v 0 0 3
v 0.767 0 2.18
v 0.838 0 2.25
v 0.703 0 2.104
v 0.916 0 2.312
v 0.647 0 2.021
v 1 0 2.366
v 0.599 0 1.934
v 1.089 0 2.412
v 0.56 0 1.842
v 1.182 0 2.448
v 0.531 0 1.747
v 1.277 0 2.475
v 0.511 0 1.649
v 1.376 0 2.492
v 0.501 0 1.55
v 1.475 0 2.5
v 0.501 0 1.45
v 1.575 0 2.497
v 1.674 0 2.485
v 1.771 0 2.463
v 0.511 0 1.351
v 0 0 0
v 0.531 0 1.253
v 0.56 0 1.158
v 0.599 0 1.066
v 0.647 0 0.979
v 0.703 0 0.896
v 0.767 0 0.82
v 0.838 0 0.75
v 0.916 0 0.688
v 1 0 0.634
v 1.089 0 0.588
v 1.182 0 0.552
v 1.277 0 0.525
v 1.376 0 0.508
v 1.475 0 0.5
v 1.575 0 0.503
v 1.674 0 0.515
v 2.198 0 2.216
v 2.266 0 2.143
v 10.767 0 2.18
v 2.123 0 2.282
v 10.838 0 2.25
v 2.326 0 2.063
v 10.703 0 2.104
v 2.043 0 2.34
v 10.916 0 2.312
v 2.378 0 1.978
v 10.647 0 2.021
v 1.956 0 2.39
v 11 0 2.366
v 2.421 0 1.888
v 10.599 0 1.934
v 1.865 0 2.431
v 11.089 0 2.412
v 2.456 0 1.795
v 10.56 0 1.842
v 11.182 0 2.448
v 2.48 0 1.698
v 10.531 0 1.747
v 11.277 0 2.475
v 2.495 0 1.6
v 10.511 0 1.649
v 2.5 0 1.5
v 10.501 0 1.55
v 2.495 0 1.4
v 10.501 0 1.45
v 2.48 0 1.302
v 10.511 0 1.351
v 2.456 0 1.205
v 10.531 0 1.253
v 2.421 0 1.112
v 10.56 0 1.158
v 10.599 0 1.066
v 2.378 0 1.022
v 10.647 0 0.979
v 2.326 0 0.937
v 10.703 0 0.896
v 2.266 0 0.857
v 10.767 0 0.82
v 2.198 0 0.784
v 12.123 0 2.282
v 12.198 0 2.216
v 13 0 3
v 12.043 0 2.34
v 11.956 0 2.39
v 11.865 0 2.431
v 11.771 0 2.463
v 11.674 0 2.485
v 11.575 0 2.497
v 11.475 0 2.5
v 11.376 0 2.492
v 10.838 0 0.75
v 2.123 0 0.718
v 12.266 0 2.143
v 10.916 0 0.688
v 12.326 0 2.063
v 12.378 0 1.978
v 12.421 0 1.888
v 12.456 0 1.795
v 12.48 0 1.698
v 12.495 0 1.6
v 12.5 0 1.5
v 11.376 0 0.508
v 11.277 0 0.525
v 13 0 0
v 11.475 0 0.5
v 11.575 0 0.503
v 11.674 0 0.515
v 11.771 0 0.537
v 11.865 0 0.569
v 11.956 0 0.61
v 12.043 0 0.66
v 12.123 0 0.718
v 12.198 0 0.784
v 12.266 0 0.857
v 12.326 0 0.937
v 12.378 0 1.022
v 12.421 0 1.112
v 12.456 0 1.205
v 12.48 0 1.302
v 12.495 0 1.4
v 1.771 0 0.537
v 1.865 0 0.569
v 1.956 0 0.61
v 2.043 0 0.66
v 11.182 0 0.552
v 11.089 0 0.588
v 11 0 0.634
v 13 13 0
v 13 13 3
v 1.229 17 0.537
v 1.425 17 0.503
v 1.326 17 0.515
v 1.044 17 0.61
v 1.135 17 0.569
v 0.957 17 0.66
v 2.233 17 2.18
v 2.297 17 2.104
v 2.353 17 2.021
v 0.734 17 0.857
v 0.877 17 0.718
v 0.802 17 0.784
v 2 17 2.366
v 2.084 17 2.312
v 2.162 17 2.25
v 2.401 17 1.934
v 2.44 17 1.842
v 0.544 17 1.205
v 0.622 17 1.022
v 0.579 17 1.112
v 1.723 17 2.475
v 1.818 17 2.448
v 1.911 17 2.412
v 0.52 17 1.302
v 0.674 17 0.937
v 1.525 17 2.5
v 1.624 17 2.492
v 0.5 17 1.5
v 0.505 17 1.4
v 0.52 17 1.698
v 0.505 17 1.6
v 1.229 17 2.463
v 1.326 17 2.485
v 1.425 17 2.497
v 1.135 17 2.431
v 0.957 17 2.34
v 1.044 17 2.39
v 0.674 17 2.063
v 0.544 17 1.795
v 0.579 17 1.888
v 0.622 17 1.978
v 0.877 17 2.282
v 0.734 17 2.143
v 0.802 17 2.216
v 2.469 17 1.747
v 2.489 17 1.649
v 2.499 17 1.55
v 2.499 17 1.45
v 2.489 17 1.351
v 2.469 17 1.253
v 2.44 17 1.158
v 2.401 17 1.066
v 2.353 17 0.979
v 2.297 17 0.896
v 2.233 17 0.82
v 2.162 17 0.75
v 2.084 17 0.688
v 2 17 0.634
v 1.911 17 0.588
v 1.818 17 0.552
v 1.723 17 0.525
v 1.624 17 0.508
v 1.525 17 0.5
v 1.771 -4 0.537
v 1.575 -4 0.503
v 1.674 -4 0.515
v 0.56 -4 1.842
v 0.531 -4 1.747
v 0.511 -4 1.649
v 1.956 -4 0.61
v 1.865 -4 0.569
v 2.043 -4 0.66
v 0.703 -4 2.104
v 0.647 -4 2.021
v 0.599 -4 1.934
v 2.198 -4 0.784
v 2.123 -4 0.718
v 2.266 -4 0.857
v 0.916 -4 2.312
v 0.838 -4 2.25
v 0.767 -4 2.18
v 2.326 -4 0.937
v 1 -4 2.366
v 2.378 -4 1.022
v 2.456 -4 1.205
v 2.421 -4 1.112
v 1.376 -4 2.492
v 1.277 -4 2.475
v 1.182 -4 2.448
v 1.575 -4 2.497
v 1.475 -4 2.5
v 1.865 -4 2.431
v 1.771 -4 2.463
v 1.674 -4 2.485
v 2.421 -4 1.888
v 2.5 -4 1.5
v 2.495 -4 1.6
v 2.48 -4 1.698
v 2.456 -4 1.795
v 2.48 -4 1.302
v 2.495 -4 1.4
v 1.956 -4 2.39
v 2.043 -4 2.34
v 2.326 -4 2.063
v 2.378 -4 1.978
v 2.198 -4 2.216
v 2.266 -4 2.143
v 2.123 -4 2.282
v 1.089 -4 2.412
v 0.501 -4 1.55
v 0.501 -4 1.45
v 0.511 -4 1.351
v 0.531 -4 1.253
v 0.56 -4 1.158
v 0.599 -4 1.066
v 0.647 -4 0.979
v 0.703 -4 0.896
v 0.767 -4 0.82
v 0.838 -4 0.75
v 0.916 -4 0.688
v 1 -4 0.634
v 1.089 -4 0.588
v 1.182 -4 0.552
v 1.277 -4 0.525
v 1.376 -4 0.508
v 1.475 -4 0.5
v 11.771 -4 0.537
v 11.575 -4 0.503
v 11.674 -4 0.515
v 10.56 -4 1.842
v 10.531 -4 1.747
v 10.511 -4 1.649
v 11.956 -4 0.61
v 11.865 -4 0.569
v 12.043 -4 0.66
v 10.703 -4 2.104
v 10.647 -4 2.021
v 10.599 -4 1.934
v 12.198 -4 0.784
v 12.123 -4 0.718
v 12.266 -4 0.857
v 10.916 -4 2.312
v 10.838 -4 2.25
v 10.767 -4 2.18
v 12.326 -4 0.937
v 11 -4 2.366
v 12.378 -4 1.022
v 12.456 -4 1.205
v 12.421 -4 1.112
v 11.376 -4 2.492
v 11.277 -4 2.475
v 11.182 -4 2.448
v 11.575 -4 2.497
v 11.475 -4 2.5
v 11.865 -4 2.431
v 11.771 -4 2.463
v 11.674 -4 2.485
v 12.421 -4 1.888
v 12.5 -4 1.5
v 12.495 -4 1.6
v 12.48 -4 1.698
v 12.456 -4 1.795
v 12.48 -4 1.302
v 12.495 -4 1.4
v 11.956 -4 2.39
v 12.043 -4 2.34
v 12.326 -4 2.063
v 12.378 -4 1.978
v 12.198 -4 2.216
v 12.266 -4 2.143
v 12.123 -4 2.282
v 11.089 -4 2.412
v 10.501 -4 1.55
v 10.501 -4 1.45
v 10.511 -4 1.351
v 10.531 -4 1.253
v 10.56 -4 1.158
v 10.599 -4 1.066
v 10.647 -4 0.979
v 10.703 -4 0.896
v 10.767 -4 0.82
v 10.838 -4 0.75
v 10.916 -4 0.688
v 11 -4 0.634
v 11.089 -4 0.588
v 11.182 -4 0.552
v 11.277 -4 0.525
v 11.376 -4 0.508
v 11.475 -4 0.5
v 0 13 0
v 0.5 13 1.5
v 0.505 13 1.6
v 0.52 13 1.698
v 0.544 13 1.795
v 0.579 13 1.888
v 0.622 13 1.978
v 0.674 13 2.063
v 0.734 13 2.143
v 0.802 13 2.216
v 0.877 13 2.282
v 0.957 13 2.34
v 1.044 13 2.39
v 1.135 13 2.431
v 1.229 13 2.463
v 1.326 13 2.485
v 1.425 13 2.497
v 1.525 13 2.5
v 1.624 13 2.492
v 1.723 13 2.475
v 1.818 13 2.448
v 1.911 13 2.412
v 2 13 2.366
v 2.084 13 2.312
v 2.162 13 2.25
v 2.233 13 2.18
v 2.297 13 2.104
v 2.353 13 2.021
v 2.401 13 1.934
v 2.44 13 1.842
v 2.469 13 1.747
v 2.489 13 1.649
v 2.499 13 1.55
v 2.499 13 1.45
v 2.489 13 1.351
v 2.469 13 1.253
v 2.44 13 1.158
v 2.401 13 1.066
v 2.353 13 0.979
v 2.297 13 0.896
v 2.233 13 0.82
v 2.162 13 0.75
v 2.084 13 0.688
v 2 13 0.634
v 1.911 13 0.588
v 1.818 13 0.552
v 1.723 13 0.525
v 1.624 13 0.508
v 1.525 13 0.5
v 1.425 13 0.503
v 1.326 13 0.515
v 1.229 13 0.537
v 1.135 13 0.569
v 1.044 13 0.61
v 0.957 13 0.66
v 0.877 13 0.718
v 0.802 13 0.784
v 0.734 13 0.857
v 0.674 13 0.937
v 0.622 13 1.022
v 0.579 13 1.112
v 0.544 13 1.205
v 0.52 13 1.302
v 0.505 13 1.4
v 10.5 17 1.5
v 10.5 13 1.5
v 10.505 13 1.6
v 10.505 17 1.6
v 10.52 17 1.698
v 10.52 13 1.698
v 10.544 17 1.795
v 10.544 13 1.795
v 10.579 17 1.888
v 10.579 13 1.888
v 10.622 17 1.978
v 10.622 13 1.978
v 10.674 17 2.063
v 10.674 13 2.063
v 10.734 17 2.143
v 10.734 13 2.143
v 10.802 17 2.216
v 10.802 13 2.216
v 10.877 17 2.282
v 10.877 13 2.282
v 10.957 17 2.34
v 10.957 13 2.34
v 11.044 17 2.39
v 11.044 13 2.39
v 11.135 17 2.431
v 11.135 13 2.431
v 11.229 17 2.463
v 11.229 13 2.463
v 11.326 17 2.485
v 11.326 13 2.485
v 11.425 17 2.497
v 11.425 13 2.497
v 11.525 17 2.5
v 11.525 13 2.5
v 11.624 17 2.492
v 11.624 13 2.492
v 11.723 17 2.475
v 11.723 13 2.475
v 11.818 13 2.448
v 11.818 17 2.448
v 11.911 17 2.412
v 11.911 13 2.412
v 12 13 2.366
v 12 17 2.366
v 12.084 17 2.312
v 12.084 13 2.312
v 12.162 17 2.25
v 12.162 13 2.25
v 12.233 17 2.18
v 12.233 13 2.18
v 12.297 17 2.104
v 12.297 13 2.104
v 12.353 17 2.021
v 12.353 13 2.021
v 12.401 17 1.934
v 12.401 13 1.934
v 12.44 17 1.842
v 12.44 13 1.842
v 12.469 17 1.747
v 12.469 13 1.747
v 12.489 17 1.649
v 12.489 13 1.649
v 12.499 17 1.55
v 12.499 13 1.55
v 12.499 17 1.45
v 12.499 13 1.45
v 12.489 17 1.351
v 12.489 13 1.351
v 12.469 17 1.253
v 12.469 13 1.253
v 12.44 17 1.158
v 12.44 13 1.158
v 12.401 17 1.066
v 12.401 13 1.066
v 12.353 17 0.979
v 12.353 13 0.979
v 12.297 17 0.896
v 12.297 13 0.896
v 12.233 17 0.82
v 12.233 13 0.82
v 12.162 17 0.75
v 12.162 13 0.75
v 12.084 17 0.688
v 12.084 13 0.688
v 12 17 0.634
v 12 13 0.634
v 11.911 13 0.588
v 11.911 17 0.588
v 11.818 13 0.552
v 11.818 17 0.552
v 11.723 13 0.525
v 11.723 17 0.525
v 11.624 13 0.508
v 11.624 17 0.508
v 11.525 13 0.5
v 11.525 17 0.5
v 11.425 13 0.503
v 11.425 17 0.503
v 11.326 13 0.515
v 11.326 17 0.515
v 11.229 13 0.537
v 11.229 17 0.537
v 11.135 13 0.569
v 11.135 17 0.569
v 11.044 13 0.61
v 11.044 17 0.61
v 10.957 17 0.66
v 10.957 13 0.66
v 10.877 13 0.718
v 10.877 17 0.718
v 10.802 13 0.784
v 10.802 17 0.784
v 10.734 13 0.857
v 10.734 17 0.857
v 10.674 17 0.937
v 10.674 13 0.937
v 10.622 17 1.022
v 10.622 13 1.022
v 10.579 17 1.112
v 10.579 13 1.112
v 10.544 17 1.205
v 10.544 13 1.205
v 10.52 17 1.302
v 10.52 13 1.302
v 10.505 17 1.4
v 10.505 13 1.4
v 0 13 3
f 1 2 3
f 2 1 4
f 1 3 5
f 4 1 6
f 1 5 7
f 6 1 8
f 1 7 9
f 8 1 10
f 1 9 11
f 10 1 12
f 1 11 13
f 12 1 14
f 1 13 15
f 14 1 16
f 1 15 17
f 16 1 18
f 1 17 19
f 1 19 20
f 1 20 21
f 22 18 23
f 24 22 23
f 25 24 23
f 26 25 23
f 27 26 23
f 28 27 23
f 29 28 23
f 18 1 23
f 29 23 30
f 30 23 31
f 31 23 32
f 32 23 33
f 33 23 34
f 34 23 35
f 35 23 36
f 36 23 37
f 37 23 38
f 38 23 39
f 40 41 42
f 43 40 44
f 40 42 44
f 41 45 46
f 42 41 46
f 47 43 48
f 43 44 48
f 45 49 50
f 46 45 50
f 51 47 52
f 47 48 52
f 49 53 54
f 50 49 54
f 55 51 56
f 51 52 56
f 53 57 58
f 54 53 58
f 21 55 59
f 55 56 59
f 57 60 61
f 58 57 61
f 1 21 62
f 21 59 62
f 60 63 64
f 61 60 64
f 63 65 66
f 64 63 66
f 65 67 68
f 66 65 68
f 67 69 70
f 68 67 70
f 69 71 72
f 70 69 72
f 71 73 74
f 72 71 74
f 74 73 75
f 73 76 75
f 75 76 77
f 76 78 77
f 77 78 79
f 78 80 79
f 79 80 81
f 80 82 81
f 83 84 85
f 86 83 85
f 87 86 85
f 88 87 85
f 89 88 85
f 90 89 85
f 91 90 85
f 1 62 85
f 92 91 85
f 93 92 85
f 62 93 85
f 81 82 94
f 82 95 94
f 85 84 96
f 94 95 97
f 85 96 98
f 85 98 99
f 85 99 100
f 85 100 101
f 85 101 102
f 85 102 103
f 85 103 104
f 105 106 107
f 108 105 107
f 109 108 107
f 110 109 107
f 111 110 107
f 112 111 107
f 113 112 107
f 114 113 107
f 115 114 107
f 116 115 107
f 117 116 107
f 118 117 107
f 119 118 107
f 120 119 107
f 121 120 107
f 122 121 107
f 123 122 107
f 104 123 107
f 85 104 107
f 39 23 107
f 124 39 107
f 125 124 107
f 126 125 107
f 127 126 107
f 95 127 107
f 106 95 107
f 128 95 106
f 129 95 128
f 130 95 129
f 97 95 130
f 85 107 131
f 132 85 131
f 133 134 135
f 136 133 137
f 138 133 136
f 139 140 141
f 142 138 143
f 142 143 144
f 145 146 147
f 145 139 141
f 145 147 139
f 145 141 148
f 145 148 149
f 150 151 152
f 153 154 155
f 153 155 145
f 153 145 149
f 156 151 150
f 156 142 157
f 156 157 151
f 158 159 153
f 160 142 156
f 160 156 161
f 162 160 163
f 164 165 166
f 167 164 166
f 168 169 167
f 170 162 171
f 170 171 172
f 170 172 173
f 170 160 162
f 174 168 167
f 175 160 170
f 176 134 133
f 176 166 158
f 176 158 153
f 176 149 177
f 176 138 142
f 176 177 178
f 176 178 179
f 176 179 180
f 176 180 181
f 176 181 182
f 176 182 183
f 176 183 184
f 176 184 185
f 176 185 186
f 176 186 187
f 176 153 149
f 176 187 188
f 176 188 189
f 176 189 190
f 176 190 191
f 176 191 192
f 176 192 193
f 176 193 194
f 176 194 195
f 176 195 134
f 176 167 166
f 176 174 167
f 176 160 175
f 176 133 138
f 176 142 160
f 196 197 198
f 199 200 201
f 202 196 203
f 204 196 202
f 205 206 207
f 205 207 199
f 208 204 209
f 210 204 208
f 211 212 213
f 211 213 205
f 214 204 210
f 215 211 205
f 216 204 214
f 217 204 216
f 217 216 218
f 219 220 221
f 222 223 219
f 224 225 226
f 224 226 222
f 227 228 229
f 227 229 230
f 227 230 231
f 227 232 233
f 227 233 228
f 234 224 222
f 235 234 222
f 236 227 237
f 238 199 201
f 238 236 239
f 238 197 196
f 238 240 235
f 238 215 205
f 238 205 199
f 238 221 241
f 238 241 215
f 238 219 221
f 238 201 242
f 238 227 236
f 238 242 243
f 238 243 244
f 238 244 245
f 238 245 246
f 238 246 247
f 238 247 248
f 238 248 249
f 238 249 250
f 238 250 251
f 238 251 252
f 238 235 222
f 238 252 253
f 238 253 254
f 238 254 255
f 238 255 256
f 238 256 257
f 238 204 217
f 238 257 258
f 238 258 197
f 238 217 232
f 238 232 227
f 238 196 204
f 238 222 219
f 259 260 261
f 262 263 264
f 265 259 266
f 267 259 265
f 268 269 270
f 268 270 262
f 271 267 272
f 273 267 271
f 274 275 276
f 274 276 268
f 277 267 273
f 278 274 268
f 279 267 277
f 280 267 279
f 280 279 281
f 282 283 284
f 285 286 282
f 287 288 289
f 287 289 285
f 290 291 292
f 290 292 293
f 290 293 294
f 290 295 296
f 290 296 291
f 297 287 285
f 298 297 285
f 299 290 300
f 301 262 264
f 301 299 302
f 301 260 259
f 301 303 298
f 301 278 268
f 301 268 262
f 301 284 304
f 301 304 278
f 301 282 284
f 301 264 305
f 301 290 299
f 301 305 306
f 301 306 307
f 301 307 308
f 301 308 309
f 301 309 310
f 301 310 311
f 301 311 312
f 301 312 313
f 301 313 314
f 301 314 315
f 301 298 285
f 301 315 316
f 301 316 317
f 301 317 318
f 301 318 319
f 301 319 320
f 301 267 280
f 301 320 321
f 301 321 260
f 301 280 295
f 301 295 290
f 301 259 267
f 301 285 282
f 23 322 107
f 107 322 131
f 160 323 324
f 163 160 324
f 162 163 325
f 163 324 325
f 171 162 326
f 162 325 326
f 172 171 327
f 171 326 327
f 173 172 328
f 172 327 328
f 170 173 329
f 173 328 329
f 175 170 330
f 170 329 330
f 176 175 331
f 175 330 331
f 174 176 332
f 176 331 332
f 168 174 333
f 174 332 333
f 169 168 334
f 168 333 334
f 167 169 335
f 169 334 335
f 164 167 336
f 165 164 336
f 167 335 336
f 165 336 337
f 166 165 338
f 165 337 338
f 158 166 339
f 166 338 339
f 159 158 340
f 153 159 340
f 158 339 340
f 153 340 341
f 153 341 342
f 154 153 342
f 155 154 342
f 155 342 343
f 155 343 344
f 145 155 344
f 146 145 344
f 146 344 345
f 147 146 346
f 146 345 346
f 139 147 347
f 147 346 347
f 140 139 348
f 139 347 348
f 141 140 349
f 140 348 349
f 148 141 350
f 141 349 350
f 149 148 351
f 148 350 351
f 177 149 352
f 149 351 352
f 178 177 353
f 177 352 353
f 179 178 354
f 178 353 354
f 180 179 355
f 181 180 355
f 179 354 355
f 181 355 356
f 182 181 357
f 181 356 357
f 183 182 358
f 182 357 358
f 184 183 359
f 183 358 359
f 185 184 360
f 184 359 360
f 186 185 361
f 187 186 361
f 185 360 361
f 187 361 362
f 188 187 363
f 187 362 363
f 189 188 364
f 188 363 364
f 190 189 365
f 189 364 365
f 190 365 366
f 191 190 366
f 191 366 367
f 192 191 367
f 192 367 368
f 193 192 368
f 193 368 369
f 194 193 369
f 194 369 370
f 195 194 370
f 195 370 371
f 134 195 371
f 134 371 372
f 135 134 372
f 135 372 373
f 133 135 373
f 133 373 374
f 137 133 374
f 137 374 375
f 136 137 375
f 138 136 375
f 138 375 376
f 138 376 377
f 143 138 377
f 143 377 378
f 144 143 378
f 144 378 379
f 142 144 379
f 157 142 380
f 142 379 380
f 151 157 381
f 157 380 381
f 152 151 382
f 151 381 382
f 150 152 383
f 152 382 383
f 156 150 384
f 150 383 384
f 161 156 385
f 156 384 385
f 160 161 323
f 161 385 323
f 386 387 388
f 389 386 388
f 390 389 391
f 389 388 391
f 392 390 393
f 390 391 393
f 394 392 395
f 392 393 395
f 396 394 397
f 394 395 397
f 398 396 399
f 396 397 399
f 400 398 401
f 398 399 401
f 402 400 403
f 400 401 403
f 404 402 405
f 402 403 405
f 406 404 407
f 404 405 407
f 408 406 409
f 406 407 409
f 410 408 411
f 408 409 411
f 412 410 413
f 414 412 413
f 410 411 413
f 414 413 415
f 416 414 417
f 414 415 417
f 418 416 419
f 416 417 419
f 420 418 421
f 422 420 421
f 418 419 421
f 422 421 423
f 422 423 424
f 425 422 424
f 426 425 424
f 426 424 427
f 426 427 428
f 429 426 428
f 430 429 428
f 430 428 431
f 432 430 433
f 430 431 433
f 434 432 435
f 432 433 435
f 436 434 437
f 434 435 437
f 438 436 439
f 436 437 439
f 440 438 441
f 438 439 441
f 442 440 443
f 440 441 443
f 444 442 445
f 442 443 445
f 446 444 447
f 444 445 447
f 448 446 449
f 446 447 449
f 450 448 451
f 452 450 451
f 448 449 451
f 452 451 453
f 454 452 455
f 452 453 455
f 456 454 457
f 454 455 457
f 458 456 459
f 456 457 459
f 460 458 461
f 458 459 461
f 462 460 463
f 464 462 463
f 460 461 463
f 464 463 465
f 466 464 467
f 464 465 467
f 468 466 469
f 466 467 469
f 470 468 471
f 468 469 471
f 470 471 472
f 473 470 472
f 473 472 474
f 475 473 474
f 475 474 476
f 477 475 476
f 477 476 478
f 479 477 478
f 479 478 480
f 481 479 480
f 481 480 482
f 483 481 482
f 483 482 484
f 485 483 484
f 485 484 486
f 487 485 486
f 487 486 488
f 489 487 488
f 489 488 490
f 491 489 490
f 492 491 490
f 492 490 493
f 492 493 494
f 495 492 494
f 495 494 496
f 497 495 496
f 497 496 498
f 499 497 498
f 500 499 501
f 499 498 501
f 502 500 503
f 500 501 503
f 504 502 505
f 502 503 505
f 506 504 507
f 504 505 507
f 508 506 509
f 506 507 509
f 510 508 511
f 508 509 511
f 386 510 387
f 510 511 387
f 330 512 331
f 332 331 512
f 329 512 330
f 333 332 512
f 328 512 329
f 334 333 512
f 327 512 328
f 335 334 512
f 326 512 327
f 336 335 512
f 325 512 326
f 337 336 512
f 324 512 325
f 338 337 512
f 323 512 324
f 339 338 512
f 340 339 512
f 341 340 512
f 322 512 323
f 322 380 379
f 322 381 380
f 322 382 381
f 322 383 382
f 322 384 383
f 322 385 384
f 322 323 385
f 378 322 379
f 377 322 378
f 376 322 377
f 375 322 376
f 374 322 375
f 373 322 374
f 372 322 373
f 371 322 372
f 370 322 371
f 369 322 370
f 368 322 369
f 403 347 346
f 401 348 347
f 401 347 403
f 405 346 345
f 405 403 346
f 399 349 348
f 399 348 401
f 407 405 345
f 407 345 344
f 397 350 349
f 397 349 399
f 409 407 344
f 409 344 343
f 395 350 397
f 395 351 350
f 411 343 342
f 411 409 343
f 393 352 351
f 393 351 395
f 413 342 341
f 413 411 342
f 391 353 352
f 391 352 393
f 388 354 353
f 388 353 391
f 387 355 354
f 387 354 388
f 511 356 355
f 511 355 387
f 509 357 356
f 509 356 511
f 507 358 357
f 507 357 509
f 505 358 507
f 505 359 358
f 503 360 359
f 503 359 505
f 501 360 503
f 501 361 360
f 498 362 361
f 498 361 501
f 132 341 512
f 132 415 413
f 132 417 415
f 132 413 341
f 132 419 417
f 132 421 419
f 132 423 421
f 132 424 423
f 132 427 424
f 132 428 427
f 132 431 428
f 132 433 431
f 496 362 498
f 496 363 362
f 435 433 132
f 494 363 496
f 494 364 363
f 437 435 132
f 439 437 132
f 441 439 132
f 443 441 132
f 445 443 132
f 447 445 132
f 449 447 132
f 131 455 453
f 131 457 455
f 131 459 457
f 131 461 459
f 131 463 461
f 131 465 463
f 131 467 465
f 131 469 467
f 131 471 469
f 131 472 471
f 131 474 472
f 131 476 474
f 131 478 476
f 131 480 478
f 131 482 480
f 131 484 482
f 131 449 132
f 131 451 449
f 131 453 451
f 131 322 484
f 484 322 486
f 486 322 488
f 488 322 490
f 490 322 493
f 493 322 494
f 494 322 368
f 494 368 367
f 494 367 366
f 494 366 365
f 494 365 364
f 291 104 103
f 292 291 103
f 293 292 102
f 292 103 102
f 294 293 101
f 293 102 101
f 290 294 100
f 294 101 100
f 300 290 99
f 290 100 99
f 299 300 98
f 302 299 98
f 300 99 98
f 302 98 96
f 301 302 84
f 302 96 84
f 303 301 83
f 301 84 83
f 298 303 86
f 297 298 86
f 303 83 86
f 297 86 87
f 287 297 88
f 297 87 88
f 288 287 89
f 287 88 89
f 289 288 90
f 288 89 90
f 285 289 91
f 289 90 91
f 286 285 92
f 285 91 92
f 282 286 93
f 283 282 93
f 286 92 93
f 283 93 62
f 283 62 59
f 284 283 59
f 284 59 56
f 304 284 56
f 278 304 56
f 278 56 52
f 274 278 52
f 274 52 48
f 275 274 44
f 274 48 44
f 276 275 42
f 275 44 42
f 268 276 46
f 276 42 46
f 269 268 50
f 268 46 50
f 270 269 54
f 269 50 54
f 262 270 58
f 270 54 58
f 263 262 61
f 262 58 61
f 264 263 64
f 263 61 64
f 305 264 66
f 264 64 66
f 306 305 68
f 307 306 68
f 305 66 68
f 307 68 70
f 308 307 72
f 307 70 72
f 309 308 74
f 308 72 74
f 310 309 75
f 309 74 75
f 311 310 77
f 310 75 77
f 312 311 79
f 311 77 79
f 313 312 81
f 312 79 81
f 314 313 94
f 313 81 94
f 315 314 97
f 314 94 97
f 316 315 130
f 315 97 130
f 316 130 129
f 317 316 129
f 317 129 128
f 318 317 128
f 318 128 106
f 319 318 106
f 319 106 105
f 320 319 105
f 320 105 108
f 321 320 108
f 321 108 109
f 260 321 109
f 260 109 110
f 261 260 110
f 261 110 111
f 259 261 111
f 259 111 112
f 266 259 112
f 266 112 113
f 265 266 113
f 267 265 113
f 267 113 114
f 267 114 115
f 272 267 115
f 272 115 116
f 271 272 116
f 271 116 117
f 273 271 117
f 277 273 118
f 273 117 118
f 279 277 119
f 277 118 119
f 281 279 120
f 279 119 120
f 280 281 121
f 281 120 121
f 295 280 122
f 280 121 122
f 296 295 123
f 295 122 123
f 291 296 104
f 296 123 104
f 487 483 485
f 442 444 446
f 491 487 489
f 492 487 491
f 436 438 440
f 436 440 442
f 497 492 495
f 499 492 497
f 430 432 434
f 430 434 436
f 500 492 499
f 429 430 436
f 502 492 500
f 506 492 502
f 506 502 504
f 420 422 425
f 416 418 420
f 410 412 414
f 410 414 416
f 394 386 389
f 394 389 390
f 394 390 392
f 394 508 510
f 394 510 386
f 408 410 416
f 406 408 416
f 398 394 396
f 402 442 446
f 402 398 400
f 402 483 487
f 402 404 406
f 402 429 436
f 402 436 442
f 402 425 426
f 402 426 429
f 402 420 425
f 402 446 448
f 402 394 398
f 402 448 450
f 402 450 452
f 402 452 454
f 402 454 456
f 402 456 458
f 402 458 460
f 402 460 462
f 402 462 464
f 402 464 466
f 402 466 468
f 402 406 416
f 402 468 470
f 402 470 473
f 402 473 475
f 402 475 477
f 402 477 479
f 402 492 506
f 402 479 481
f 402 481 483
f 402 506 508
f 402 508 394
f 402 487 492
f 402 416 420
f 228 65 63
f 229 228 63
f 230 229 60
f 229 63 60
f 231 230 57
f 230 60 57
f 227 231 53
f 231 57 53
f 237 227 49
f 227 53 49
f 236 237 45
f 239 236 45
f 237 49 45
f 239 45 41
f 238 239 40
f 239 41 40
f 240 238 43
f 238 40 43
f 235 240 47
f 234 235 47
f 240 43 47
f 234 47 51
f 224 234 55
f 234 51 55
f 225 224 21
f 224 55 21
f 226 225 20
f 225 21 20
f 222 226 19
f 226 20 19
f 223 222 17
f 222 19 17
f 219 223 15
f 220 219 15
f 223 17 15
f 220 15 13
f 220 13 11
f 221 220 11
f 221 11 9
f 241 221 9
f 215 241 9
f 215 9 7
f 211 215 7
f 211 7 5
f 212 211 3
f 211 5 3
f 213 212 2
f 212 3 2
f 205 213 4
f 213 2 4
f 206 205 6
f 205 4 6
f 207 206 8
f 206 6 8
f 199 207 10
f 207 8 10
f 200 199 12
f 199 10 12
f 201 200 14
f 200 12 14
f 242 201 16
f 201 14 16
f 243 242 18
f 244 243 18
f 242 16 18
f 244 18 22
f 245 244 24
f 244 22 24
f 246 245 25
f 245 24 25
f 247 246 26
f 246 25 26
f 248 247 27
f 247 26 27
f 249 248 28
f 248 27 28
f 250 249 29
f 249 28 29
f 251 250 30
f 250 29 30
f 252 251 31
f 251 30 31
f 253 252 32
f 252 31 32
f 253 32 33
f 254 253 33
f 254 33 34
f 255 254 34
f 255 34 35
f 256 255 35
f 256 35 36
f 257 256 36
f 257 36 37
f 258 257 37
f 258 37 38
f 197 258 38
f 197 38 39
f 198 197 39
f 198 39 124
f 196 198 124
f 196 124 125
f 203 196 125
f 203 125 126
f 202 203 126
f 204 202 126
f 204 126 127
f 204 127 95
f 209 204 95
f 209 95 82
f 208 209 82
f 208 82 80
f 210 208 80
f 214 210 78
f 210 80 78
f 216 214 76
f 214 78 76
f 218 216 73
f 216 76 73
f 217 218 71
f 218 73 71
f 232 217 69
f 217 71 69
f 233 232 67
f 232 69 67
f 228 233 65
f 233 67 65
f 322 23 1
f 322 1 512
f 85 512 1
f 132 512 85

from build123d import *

# Parameters (mm, degrees)
F0_W     = 13
F0_H     = 13
F1_DEPTH = 3
F2_R     = 1
F3_DEPTH = 4
F4_R     = 1
F5_DEPTH = 4


with BuildPart() as f1:
    # F0 (on Top) → F1 (new body)
    with BuildSketch(Plane.XY):
        with Locations((6.5, 6.5)):
            Rectangle(F0_W, F0_H)
    extrude(amount=F1_DEPTH)

    # F2 (on face) → F3 (join)
    with BuildSketch(Plane.XZ):
        with Locations((1.5, 1.5)):
            Circle(F2_R)
        with Locations((11.5, 1.5)):
            Circle(F2_R)
    extrude(amount=F3_DEPTH)

    # F4 (on face) → F5 (join)
    with BuildSketch(Plane(origin=(0, 13, 0), x_dir=(-1, 0, 0), z_dir=(0, 1, 0))):
        with Locations((-11.5, 1.5)):
            Circle(F4_R)
        with Locations((-1.5, 1.5)):
            Circle(F4_R)
    extrude(amount=F5_DEPTH)


solid = f1.part
